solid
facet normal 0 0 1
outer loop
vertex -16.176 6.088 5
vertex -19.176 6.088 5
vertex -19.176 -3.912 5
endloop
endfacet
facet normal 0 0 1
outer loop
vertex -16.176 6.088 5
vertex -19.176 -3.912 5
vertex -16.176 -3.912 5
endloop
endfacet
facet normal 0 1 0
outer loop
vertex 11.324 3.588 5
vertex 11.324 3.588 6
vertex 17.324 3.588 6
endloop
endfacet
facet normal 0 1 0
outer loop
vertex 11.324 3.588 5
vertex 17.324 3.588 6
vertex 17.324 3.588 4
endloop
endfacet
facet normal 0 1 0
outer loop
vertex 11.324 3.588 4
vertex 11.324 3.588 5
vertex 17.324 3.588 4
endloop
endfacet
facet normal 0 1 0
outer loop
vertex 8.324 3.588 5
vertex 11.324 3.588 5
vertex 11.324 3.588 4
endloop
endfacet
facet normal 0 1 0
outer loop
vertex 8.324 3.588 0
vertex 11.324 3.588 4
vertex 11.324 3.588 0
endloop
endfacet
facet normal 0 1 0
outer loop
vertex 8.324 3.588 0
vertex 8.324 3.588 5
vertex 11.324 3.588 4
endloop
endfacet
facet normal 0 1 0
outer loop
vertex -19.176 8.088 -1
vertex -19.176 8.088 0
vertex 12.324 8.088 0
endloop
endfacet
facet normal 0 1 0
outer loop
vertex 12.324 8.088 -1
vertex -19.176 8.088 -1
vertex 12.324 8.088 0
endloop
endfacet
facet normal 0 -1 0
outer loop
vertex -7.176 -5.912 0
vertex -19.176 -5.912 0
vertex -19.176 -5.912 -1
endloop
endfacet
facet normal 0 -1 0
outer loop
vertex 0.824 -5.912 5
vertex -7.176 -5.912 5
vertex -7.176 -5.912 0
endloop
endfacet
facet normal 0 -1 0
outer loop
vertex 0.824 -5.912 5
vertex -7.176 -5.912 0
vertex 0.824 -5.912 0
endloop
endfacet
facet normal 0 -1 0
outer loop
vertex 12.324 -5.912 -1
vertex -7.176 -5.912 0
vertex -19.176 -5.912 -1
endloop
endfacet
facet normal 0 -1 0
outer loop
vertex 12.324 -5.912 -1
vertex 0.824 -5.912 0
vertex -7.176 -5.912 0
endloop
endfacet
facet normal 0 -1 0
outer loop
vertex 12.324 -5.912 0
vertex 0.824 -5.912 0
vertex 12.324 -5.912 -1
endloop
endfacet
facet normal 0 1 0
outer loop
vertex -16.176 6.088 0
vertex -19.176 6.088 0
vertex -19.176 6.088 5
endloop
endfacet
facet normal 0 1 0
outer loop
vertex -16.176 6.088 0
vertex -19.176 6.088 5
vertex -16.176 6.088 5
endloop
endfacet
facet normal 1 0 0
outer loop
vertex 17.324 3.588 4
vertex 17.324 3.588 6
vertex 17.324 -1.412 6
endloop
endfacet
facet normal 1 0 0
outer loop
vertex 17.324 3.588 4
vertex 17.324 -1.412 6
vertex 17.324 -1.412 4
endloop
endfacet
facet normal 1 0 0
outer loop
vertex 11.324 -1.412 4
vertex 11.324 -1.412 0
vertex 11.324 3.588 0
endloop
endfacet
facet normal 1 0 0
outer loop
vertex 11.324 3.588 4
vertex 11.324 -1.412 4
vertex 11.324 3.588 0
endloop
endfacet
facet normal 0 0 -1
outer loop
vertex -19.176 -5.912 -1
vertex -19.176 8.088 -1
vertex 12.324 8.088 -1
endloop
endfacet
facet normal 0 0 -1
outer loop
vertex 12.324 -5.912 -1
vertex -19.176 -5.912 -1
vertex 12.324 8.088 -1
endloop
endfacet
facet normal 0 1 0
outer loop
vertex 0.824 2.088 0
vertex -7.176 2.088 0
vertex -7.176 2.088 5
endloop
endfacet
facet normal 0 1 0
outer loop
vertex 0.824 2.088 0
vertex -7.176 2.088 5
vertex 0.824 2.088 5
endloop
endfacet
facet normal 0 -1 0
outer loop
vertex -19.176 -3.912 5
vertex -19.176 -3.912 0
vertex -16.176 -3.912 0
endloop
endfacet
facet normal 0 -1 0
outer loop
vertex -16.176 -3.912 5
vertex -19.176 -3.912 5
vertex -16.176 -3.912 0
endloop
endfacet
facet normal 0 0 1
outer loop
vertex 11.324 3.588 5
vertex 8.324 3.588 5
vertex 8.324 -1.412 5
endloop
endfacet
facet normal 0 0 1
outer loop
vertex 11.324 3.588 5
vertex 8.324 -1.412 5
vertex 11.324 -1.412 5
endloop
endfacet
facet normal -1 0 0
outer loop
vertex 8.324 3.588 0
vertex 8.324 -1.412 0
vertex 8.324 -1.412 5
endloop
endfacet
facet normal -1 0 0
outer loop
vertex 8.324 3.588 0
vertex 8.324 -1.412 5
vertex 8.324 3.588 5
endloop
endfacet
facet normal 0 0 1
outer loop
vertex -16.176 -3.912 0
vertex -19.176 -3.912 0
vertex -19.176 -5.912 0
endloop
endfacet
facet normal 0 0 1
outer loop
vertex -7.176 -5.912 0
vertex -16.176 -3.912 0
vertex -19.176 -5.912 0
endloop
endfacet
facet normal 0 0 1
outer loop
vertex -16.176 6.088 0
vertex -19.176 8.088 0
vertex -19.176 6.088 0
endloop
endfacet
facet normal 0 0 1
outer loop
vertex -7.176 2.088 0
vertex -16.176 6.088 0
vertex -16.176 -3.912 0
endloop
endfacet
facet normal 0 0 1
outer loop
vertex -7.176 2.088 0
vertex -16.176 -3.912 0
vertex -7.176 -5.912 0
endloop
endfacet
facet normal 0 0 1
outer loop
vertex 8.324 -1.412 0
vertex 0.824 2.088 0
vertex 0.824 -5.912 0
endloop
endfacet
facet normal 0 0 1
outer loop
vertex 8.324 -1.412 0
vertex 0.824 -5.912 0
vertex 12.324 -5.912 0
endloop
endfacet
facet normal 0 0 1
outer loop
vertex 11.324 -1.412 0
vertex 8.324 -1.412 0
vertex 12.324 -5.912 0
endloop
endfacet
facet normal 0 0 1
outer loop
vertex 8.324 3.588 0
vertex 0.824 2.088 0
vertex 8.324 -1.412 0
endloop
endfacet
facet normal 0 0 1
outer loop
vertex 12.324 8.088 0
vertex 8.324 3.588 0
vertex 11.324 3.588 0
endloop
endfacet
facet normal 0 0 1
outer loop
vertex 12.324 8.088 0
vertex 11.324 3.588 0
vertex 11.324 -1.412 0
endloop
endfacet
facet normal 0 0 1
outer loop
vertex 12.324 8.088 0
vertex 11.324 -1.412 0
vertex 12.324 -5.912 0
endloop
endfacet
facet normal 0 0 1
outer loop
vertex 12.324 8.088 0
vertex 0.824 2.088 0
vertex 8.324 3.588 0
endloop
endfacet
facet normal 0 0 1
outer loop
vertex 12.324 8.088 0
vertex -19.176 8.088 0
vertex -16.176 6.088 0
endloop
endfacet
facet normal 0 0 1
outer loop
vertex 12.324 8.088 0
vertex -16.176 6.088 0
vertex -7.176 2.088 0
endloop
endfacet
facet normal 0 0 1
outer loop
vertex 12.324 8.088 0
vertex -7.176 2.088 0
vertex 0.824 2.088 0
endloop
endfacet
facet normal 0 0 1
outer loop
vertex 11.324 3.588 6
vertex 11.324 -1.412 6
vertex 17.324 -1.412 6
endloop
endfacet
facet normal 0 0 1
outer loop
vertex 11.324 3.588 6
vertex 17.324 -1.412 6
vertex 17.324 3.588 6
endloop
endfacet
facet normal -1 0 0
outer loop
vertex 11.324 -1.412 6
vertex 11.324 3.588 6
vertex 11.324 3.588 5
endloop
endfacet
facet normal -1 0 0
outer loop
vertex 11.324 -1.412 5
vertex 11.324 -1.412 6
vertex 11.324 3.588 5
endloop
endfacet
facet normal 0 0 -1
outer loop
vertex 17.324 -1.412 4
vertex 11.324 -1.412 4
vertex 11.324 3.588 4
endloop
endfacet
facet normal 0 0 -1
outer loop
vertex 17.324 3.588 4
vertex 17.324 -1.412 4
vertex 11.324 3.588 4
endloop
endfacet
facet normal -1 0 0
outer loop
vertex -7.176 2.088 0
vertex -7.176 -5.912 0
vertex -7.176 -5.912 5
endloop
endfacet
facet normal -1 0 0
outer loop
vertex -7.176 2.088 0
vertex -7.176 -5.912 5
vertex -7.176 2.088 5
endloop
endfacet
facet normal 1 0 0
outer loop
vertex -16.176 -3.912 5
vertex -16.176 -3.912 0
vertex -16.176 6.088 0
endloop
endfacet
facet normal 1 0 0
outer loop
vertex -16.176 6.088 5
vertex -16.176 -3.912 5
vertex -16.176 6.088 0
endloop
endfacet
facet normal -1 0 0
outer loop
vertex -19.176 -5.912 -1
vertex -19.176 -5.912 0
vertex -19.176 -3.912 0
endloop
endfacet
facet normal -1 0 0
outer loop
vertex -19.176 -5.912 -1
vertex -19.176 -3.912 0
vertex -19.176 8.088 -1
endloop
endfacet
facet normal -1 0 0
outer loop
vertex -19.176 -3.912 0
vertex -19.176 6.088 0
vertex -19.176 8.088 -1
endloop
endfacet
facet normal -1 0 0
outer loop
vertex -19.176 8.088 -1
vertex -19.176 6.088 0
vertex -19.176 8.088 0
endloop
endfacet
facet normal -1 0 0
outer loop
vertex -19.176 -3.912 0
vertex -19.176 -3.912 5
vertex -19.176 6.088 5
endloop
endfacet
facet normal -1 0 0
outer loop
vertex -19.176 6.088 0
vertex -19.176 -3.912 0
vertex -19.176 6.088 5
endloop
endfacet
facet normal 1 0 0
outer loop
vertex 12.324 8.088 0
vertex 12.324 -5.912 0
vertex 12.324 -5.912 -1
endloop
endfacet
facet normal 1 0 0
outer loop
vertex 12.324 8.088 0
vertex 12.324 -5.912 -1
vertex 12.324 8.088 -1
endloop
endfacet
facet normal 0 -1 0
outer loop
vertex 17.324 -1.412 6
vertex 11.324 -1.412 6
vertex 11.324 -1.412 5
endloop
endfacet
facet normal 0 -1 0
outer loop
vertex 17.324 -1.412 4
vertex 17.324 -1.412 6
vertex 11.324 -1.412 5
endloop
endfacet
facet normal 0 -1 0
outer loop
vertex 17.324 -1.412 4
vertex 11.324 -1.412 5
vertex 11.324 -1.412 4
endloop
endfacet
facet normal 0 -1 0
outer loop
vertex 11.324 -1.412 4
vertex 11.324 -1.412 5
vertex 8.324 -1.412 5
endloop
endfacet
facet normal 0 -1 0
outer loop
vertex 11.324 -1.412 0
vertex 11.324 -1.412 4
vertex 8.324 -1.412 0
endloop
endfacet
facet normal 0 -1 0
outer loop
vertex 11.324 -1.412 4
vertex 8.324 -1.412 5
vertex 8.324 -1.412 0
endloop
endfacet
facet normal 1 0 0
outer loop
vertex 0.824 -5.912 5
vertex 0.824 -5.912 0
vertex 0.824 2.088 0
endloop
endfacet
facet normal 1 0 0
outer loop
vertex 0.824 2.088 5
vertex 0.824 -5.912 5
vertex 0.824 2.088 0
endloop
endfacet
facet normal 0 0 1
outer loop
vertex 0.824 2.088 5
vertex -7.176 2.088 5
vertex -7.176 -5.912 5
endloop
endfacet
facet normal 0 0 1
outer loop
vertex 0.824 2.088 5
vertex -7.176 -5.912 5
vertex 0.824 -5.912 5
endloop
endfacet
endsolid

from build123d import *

# Parameters (mm, degrees)
ESQUISSE1_W        = 31.5
ESQUISSE1_H        = 14
BOSS_EXTRU_1_DEPTH = 1
ESQUISSE2_W        = 8
ESQUISSE2_H        = 8
BOSS_EXTRU_2_DEPTH = 5
ESQUISSE3_W        = 3
ESQUISSE3_H        = 5
BOSS_EXTRU_3_DEPTH = 5
ESQUISSE4_W        = 3
ESQUISSE4_H        = 10
BOSS_EXTRU_4_DEPTH = 5
ESQUISSE6_W        = 2
ESQUISSE6_H        = 5
BOSS_EXTRU_6_DEPTH = 6


with BuildPart() as part:
    # Esquisse1 → Boss.-Extru.1 (new body)
    with BuildSketch(Plane.XY):
        with Locations((-3.425842613, 1.088280058)):
            Rectangle(ESQUISSE1_W, ESQUISSE1_H)
    extrude(amount=-BOSS_EXTRU_1_DEPTH)

    # Esquisse2 → Boss.-Extru.2 (add)
    with BuildSketch(Plane.XY):
        with Locations((-3.175842613, -1.911719942)):
            Rectangle(ESQUISSE2_W, ESQUISSE2_H)
    extrude(amount=BOSS_EXTRU_2_DEPTH)

    # Esquisse3 → Boss.-Extru.3 (add)
    with BuildSketch(Plane.XY):
        with Locations((9.824157387, 1.088280058)):
            Rectangle(ESQUISSE3_W, ESQUISSE3_H)
    extrude(amount=BOSS_EXTRU_3_DEPTH)

    # Esquisse4 → Boss.-Extru.4 (add)
    with BuildSketch(Plane.XY):
        with Locations((-17.675842613, 1.088280058)):
            Rectangle(ESQUISSE4_W, ESQUISSE4_H)
    extrude(amount=BOSS_EXTRU_4_DEPTH)

    # Esquisse6 → Boss.-Extru.6 (add)
    with BuildSketch(Plane(origin=(11.324157387, 0, 0), x_dir=(0, 0, -1), z_dir=(1, 0, 0))):
        with Locations((-5, 1.088280058)):
            Rectangle(ESQUISSE6_W, ESQUISSE6_H)
    extrude(amount=BOSS_EXTRU_6_DEPTH)


solid = part.part
